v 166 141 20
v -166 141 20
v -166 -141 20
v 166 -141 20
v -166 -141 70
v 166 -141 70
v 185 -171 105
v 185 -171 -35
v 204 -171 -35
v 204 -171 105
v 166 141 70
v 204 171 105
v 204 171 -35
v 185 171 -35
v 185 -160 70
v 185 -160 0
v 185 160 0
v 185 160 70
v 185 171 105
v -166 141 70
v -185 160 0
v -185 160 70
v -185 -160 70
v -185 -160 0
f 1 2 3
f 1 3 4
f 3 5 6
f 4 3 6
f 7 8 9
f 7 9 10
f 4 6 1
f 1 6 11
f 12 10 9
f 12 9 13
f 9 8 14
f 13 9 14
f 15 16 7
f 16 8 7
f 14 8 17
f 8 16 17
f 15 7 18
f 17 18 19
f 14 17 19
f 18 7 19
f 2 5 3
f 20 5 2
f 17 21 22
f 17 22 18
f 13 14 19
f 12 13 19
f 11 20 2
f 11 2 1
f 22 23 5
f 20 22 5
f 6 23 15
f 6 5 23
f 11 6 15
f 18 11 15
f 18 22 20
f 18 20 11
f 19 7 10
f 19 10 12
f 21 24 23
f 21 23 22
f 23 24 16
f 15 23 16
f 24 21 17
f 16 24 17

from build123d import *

# Parameters (mm, degrees)
F0_W      = 370
F0_H      = 320
F1_DEPTH  = 70
F2_W      = 332
F2_H      = 282
F3_DEPTH  = 25
F3_FACE_W = 332
F3_FACE_H = 282
F4_DEPTH  = 11
F5_DEPTH  = 25
F6_W      = 342
F6_H      = 140
F6_W_2    = 320
F6_H_2    = 70
F7_DEPTH  = 19


with BuildPart() as f1:
    # F0 (on Top) → F1 (new body)
    with BuildSketch(Plane.XY):
        Rectangle(F0_W, F0_H)
    extrude(amount=F1_DEPTH)

    # F2 (on face) → F3 (cut)
    with BuildSketch(Plane.XY.offset(70)):
        Rectangle(F2_W, F2_H)
    extrude(amount=-F3_DEPTH, mode=Mode.SUBTRACT)

    # F3_face (on face) → F4 (join)
    with BuildSketch(Plane.XY.offset(45)):
        Rectangle(F3_FACE_W, F3_FACE_H)
    extrude(amount=-F4_DEPTH)

    # F3_face (on face) → F5 (cut)
    with BuildSketch(Plane.XY.offset(45)):
        Rectangle(F3_FACE_W, F3_FACE_H)
    extrude(amount=-F5_DEPTH, mode=Mode.SUBTRACT)

    # F6 (on face) → F7 (join)
    with BuildSketch(Plane.YZ.offset(185)):
        with Locations((0, 35)):
            Rectangle(F6_W, F6_H)
        with Locations((0, 35)):
            Rectangle(F6_W_2, F6_H_2, mode=Mode.SUBTRACT)
        with Locations((0, 35)):
            Rectangle(F6_W_2, F6_H_2)
    extrude(amount=F7_DEPTH)


solid = f1.part
